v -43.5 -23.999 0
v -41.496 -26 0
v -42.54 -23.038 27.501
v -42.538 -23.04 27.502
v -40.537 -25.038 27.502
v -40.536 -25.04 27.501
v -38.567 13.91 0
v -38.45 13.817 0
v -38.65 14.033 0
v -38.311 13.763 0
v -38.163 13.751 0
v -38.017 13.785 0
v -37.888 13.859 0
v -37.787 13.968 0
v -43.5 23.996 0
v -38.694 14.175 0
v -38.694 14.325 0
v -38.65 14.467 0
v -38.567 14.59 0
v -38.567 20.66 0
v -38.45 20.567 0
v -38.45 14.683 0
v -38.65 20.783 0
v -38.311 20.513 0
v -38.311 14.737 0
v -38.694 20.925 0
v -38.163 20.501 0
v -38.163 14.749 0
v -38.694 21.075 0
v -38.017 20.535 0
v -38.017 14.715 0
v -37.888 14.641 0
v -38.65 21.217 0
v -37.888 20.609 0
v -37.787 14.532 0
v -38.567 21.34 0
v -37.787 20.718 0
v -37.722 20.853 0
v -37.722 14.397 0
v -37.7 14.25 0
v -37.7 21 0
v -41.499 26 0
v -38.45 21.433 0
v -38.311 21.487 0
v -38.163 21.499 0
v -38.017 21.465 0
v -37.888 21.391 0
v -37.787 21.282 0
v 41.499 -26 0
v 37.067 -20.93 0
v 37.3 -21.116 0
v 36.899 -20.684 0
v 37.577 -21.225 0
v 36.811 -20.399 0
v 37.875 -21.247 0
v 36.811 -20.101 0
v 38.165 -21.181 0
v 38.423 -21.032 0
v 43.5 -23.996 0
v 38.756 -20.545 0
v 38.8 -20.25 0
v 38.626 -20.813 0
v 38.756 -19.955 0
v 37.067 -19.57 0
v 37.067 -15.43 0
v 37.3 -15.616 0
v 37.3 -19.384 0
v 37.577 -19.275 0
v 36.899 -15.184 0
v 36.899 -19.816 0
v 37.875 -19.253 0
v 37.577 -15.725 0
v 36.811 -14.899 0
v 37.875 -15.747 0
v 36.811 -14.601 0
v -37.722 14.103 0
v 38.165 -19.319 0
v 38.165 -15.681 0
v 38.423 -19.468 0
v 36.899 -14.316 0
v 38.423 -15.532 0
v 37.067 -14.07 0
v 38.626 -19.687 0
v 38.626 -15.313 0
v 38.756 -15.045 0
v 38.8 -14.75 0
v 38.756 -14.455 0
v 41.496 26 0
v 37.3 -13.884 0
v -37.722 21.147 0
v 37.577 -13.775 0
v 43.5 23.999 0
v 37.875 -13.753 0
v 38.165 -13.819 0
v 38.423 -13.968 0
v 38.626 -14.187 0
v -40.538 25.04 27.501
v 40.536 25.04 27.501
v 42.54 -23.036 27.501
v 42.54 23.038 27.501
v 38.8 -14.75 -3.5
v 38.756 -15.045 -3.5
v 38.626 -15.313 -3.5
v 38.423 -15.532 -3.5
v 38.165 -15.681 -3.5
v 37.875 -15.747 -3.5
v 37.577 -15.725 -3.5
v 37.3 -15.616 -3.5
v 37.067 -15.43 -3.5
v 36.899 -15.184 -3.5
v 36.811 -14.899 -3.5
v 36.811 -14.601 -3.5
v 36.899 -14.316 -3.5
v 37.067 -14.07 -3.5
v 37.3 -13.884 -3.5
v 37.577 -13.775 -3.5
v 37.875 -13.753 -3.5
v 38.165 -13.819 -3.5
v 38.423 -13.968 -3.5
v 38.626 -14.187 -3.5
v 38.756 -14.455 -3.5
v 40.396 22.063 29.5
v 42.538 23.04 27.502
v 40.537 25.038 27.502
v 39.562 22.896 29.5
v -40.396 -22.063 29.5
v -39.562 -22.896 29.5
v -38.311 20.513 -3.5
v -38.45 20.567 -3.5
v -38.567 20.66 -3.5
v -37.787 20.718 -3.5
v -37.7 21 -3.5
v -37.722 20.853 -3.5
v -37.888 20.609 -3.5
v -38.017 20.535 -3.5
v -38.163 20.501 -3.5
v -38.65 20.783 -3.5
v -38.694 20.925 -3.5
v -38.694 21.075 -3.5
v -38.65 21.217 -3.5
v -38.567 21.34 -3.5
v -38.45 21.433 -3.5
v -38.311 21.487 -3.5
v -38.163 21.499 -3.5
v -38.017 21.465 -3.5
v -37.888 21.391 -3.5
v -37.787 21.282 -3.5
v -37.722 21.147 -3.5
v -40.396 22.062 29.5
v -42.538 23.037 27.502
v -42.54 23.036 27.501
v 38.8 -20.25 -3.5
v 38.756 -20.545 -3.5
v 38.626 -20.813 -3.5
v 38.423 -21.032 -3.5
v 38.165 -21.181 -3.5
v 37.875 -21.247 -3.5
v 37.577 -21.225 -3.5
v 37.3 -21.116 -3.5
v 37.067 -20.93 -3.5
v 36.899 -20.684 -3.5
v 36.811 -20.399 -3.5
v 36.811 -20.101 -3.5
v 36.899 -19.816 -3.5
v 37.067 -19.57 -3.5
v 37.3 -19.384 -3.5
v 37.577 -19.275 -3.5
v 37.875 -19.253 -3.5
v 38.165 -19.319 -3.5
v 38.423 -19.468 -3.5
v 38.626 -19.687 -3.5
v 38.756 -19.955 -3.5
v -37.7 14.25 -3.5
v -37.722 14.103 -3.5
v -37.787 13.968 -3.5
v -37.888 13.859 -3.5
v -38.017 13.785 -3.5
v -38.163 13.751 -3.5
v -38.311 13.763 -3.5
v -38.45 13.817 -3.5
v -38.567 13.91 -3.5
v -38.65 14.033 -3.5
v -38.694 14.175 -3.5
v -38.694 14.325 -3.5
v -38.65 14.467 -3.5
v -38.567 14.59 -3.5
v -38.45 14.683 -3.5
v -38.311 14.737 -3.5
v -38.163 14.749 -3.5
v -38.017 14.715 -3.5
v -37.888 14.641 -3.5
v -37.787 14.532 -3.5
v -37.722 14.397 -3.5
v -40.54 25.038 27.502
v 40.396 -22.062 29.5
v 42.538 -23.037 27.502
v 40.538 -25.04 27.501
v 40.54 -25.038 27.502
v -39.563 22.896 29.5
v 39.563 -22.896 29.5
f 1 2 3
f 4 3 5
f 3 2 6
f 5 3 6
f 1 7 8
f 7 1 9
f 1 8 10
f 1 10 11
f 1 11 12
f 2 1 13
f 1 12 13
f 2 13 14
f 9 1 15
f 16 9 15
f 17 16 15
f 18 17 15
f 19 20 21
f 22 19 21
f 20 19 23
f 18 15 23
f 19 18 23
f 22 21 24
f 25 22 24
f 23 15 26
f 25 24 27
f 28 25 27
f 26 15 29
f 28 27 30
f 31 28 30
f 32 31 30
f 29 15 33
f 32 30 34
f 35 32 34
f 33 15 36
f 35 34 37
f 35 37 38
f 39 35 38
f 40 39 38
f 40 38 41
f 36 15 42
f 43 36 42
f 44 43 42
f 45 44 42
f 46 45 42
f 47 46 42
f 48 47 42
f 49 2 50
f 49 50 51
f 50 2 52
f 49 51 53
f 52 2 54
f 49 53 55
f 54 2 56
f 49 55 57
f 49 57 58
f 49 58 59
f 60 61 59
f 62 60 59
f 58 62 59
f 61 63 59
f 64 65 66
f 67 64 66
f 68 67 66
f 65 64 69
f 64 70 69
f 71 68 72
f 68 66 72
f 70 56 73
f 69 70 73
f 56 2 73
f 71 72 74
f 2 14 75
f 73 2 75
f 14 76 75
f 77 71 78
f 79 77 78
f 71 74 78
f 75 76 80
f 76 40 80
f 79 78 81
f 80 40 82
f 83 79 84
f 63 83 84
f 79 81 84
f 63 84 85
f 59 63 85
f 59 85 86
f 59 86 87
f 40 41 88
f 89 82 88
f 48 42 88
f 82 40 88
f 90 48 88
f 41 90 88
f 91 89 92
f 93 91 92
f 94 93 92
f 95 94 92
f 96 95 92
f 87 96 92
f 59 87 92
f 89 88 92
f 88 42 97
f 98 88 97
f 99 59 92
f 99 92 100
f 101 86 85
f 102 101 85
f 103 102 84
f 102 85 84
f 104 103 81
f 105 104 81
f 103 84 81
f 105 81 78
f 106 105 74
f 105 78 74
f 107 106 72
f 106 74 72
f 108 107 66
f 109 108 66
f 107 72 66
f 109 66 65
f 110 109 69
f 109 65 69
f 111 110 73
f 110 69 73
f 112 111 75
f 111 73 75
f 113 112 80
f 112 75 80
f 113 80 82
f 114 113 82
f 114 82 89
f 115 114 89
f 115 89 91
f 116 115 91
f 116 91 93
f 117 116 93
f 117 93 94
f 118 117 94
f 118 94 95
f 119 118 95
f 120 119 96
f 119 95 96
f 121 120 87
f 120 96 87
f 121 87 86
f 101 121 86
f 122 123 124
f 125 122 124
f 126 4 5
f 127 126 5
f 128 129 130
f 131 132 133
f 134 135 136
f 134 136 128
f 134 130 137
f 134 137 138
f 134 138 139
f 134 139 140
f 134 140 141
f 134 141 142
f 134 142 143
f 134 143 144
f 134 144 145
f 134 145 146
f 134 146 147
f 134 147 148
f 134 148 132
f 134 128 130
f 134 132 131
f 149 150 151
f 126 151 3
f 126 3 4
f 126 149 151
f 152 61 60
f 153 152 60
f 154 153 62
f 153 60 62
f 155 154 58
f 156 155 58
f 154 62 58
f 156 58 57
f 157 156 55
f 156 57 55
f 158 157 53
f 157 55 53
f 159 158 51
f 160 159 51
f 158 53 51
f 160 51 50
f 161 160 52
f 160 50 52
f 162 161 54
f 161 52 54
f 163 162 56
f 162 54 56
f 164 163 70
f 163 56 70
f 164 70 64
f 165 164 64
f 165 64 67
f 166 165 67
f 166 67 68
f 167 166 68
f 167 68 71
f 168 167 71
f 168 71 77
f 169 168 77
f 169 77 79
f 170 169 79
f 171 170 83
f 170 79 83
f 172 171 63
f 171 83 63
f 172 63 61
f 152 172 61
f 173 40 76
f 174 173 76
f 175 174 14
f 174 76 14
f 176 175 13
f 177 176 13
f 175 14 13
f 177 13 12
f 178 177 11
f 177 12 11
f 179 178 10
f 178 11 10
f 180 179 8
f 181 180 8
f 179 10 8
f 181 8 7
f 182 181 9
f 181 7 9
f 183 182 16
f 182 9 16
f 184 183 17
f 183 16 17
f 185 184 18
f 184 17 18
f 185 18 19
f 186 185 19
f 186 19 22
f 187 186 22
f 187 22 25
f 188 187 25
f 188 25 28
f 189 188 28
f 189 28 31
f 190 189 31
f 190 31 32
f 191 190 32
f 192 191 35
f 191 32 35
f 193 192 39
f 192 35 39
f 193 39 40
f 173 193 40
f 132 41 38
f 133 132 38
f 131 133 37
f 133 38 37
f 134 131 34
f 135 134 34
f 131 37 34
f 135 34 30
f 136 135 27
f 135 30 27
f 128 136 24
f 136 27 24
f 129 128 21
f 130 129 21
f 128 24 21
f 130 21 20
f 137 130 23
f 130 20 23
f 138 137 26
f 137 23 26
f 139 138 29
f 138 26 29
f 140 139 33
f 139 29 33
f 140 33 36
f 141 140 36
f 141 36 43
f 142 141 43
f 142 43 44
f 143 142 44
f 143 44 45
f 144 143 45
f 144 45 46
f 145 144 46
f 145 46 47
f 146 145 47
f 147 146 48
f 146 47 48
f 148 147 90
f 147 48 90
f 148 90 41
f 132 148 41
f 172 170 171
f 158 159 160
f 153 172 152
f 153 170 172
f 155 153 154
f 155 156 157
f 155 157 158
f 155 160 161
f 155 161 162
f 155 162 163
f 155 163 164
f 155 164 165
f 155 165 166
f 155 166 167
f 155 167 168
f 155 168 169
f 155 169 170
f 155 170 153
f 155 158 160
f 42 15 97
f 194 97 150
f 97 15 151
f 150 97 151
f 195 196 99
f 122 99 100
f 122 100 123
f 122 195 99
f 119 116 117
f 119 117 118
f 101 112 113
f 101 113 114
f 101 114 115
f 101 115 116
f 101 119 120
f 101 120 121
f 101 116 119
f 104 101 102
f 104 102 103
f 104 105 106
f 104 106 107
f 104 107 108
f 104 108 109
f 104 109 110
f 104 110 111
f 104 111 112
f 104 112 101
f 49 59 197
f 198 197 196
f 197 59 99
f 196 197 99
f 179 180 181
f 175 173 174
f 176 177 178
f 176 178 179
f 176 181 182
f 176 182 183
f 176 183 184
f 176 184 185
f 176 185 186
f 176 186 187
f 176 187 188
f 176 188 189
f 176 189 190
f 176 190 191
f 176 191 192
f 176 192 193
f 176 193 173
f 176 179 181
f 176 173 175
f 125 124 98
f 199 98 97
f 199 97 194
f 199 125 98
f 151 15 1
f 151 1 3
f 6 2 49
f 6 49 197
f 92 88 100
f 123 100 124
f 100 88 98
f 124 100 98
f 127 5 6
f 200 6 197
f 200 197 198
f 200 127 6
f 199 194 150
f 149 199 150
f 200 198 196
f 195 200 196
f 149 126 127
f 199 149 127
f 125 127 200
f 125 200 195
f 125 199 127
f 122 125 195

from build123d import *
from OCP.BRepFilletAPI import BRepFilletAPI_MakeChamfer

# Parameters (mm, degrees)
SKETCH1_W           = 87
SKETCH1_H           = 52
BOSS_EXTRUDE1_DEPTH = 29.5
BOSS_EXTRUDE1_TAPER = 2
CHAMFER1_SIZE       = 2
CHAMFER1_SIZE2      = 2.002440407
CHAMFER2_SIZE       = 2
CHAMFER2_SIZE2      = 2.073631911
CHAMFER2_SIZE2_2    = 2.106466142
SKETCH2_R           = 0.5
SKETCH2_R_2         = 1
BOSS_EXTRUDE2_DEPTH = 3.5


with BuildPart() as part:
    # Sketch1 → Boss-Extrude1 (new body)
    with BuildSketch(Plane.XY):
        Rectangle(SKETCH1_W, SKETCH1_H)
    extrude(amount=BOSS_EXTRUDE1_DEPTH, taper=BOSS_EXTRUDE1_TAPER)

    # Chamfer1: one chamfer whose edges measure the first distance from different faces: ONE call of the kernel's chamfer builder (chamfer() names one face for all edges)
    chamfer1_edges_1 = [part.edges().sort_by_distance(p)[0] for p in [
        (42.98491865, -25.48491865, 14.75),
    ]]
    chamfer1_side_1 = [part.faces().sort_by_distance(p)[0] for p in [
        (0, -25.486976029, 14.691084376),
    ]]
    chamfer1_edges_2 = [part.edges().sort_by_distance(p)[0] for p in [
        (-42.984918188, -25.484918188, 14.750013228),
    ]]
    chamfer1_side_2 = [part.faces().sort_by_distance(p)[0] for p in [
        (-42.988388791, 0, 14.650628158),
    ]]
    chamfer1_edges_3 = [part.edges().sort_by_distance(p)[0] for p in [
        (-42.98491865, 25.48491865, 14.75),
    ]]
    chamfer1_side_3 = [part.faces().sort_by_distance(p)[0] for p in [
        (0, 25.486976029, 14.691084376),
    ]]
    chamfer1_edges_4 = [part.edges().sort_by_distance(p)[0] for p in [
        (42.98491865, 25.48491865, 14.75),
    ]]
    chamfer1_side_4 = [part.faces().sort_by_distance(p)[0] for p in [
        (42.988388791, 0, 14.650628158),
    ]]
    chamfer1 = BRepFilletAPI_MakeChamfer(part.part.solid().wrapped)
    for e in chamfer1_edges_1:
        chamfer1.Add(CHAMFER1_SIZE, CHAMFER1_SIZE2, e.wrapped, chamfer1_side_1[0].wrapped)  # the first distance lies on this face
    for e in chamfer1_edges_2:
        chamfer1.Add(CHAMFER1_SIZE, CHAMFER1_SIZE2, e.wrapped, chamfer1_side_2[0].wrapped)  # the first distance lies on this face
    for e in chamfer1_edges_3:
        chamfer1.Add(CHAMFER1_SIZE, CHAMFER1_SIZE2, e.wrapped, chamfer1_side_3[0].wrapped)  # the first distance lies on this face
    for e in chamfer1_edges_4:
        chamfer1.Add(CHAMFER1_SIZE, CHAMFER1_SIZE2, e.wrapped, chamfer1_side_4[0].wrapped)  # the first distance lies on this face
    add(Compound.cast(chamfer1.Shape()), mode=Mode.REPLACE)

    # Chamfer2: one chamfer whose edges measure the first distance from different faces: ONE call of the kernel's chamfer builder (chamfer() names one face for all edges)
    chamfer2_edges_1 = [part.edges().sort_by_distance(p)[0] for p in [
        (42.4698373, 0.001220947, 29.5),
    ]]
    chamfer2_side_1 = [part.faces().sort_by_distance(p)[0] for p in [
        (42.988684703, 0.001220947, 14.642154351),
    ]]
    chamfer2_edges_2 = [part.edges().sort_by_distance(p)[0] for p in [
        (0.001220947, -24.9698373, 29.5),
    ]]
    chamfer2_side_2 = [part.faces().sort_by_distance(p)[0] for p in [
        (0.001220947, -25.487076554, 14.688205709),
    ]]
    chamfer2_edges_3 = [part.edges().sort_by_distance(p)[0] for p in [
        (-0.001220947, 24.9698373, 29.5),
    ]]
    chamfer2_side_3 = [part.faces().sort_by_distance(p)[0] for p in [
        (-0.001220947, 25.487076554, 14.688205709),
    ]]
    chamfer2_edges_4 = [part.edges().sort_by_distance(p)[0] for p in [
        (-42.4698373, -0.001220947, 29.5),
    ]]
    chamfer2_side_4 = [part.faces().sort_by_distance(p)[0] for p in [
        (-42.988684703, -0.001220947, 14.642154351),
    ]]
    chamfer2_edges_5 = [part.edges().sort_by_distance(p)[0] for p in [
        (-41.469228498, 23.968007551, 29.5),
    ]]
    chamfer2_side_5 = [part.faces().sort_by_distance(p)[0] for p in [
        (-41.984309848, 24.483088901, 14.75),
    ]]
    chamfer2_edges_6 = [part.edges().sort_by_distance(p)[0] for p in [
        (-41.468007551, -23.969228498, 29.5),
    ]]
    chamfer2_side_6 = [part.faces().sort_by_distance(p)[0] for p in [
        (-41.983088901, -24.484309848, 14.75),
    ]]
    chamfer2_edges_7 = [part.edges().sort_by_distance(p)[0] for p in [
        (41.468007551, 23.969228498, 29.5),
    ]]
    chamfer2_side_7 = [part.faces().sort_by_distance(p)[0] for p in [
        (41.983088901, 24.484309848, 14.75),
    ]]
    chamfer2_edges_8 = [part.edges().sort_by_distance(p)[0] for p in [
        (41.469228498, -23.968007551, 29.5),
    ]]
    chamfer2_side_8 = [part.faces().sort_by_distance(p)[0] for p in [
        (41.984309848, -24.483088901, 14.75),
    ]]
    chamfer2 = BRepFilletAPI_MakeChamfer(part.part.solid().wrapped)
    for e in chamfer2_edges_1:
        chamfer2.Add(CHAMFER2_SIZE, CHAMFER2_SIZE2, e.wrapped, chamfer2_side_1[0].wrapped)  # the first distance lies on this face
    for e in chamfer2_edges_2:
        chamfer2.Add(CHAMFER2_SIZE, CHAMFER2_SIZE2, e.wrapped, chamfer2_side_2[0].wrapped)  # the first distance lies on this face
    for e in chamfer2_edges_3:
        chamfer2.Add(CHAMFER2_SIZE, CHAMFER2_SIZE2, e.wrapped, chamfer2_side_3[0].wrapped)  # the first distance lies on this face
    for e in chamfer2_edges_4:
        chamfer2.Add(CHAMFER2_SIZE, CHAMFER2_SIZE2, e.wrapped, chamfer2_side_4[0].wrapped)  # the first distance lies on this face
    for e in chamfer2_edges_5:
        chamfer2.Add(CHAMFER2_SIZE, CHAMFER2_SIZE2_2, e.wrapped, chamfer2_side_5[0].wrapped)  # the first distance lies on this face
    for e in chamfer2_edges_6:
        chamfer2.Add(CHAMFER2_SIZE, CHAMFER2_SIZE2_2, e.wrapped, chamfer2_side_6[0].wrapped)  # the first distance lies on this face
    for e in chamfer2_edges_7:
        chamfer2.Add(CHAMFER2_SIZE, CHAMFER2_SIZE2_2, e.wrapped, chamfer2_side_7[0].wrapped)  # the first distance lies on this face
    for e in chamfer2_edges_8:
        chamfer2.Add(CHAMFER2_SIZE, CHAMFER2_SIZE2_2, e.wrapped, chamfer2_side_8[0].wrapped)  # the first distance lies on this face
    add(Compound.cast(chamfer2.Shape()), mode=Mode.REPLACE)

    # Sketch2 → Boss-Extrude2 (add)
    with BuildSketch(Plane(origin=(0, 0, 0), x_dir=(-1, 0, 0), z_dir=(0, 0, -1))):
        with Locations(Location((38.2, 21, 0), (0, 0, 180))):
            Circle(SKETCH2_R)
        with Locations(Location((38.2, 14.25, 0), (0, 0, 180))):
            Circle(SKETCH2_R)
        with Locations(Location((-37.8, -14.75, 0), (0, 0, 180))):
            Circle(SKETCH2_R_2)
        with Locations(Location((-37.8, -20.25, 0), (0, 0, 180))):
            Circle(SKETCH2_R_2)
    extrude(amount=BOSS_EXTRUDE2_DEPTH)


solid = part.part
